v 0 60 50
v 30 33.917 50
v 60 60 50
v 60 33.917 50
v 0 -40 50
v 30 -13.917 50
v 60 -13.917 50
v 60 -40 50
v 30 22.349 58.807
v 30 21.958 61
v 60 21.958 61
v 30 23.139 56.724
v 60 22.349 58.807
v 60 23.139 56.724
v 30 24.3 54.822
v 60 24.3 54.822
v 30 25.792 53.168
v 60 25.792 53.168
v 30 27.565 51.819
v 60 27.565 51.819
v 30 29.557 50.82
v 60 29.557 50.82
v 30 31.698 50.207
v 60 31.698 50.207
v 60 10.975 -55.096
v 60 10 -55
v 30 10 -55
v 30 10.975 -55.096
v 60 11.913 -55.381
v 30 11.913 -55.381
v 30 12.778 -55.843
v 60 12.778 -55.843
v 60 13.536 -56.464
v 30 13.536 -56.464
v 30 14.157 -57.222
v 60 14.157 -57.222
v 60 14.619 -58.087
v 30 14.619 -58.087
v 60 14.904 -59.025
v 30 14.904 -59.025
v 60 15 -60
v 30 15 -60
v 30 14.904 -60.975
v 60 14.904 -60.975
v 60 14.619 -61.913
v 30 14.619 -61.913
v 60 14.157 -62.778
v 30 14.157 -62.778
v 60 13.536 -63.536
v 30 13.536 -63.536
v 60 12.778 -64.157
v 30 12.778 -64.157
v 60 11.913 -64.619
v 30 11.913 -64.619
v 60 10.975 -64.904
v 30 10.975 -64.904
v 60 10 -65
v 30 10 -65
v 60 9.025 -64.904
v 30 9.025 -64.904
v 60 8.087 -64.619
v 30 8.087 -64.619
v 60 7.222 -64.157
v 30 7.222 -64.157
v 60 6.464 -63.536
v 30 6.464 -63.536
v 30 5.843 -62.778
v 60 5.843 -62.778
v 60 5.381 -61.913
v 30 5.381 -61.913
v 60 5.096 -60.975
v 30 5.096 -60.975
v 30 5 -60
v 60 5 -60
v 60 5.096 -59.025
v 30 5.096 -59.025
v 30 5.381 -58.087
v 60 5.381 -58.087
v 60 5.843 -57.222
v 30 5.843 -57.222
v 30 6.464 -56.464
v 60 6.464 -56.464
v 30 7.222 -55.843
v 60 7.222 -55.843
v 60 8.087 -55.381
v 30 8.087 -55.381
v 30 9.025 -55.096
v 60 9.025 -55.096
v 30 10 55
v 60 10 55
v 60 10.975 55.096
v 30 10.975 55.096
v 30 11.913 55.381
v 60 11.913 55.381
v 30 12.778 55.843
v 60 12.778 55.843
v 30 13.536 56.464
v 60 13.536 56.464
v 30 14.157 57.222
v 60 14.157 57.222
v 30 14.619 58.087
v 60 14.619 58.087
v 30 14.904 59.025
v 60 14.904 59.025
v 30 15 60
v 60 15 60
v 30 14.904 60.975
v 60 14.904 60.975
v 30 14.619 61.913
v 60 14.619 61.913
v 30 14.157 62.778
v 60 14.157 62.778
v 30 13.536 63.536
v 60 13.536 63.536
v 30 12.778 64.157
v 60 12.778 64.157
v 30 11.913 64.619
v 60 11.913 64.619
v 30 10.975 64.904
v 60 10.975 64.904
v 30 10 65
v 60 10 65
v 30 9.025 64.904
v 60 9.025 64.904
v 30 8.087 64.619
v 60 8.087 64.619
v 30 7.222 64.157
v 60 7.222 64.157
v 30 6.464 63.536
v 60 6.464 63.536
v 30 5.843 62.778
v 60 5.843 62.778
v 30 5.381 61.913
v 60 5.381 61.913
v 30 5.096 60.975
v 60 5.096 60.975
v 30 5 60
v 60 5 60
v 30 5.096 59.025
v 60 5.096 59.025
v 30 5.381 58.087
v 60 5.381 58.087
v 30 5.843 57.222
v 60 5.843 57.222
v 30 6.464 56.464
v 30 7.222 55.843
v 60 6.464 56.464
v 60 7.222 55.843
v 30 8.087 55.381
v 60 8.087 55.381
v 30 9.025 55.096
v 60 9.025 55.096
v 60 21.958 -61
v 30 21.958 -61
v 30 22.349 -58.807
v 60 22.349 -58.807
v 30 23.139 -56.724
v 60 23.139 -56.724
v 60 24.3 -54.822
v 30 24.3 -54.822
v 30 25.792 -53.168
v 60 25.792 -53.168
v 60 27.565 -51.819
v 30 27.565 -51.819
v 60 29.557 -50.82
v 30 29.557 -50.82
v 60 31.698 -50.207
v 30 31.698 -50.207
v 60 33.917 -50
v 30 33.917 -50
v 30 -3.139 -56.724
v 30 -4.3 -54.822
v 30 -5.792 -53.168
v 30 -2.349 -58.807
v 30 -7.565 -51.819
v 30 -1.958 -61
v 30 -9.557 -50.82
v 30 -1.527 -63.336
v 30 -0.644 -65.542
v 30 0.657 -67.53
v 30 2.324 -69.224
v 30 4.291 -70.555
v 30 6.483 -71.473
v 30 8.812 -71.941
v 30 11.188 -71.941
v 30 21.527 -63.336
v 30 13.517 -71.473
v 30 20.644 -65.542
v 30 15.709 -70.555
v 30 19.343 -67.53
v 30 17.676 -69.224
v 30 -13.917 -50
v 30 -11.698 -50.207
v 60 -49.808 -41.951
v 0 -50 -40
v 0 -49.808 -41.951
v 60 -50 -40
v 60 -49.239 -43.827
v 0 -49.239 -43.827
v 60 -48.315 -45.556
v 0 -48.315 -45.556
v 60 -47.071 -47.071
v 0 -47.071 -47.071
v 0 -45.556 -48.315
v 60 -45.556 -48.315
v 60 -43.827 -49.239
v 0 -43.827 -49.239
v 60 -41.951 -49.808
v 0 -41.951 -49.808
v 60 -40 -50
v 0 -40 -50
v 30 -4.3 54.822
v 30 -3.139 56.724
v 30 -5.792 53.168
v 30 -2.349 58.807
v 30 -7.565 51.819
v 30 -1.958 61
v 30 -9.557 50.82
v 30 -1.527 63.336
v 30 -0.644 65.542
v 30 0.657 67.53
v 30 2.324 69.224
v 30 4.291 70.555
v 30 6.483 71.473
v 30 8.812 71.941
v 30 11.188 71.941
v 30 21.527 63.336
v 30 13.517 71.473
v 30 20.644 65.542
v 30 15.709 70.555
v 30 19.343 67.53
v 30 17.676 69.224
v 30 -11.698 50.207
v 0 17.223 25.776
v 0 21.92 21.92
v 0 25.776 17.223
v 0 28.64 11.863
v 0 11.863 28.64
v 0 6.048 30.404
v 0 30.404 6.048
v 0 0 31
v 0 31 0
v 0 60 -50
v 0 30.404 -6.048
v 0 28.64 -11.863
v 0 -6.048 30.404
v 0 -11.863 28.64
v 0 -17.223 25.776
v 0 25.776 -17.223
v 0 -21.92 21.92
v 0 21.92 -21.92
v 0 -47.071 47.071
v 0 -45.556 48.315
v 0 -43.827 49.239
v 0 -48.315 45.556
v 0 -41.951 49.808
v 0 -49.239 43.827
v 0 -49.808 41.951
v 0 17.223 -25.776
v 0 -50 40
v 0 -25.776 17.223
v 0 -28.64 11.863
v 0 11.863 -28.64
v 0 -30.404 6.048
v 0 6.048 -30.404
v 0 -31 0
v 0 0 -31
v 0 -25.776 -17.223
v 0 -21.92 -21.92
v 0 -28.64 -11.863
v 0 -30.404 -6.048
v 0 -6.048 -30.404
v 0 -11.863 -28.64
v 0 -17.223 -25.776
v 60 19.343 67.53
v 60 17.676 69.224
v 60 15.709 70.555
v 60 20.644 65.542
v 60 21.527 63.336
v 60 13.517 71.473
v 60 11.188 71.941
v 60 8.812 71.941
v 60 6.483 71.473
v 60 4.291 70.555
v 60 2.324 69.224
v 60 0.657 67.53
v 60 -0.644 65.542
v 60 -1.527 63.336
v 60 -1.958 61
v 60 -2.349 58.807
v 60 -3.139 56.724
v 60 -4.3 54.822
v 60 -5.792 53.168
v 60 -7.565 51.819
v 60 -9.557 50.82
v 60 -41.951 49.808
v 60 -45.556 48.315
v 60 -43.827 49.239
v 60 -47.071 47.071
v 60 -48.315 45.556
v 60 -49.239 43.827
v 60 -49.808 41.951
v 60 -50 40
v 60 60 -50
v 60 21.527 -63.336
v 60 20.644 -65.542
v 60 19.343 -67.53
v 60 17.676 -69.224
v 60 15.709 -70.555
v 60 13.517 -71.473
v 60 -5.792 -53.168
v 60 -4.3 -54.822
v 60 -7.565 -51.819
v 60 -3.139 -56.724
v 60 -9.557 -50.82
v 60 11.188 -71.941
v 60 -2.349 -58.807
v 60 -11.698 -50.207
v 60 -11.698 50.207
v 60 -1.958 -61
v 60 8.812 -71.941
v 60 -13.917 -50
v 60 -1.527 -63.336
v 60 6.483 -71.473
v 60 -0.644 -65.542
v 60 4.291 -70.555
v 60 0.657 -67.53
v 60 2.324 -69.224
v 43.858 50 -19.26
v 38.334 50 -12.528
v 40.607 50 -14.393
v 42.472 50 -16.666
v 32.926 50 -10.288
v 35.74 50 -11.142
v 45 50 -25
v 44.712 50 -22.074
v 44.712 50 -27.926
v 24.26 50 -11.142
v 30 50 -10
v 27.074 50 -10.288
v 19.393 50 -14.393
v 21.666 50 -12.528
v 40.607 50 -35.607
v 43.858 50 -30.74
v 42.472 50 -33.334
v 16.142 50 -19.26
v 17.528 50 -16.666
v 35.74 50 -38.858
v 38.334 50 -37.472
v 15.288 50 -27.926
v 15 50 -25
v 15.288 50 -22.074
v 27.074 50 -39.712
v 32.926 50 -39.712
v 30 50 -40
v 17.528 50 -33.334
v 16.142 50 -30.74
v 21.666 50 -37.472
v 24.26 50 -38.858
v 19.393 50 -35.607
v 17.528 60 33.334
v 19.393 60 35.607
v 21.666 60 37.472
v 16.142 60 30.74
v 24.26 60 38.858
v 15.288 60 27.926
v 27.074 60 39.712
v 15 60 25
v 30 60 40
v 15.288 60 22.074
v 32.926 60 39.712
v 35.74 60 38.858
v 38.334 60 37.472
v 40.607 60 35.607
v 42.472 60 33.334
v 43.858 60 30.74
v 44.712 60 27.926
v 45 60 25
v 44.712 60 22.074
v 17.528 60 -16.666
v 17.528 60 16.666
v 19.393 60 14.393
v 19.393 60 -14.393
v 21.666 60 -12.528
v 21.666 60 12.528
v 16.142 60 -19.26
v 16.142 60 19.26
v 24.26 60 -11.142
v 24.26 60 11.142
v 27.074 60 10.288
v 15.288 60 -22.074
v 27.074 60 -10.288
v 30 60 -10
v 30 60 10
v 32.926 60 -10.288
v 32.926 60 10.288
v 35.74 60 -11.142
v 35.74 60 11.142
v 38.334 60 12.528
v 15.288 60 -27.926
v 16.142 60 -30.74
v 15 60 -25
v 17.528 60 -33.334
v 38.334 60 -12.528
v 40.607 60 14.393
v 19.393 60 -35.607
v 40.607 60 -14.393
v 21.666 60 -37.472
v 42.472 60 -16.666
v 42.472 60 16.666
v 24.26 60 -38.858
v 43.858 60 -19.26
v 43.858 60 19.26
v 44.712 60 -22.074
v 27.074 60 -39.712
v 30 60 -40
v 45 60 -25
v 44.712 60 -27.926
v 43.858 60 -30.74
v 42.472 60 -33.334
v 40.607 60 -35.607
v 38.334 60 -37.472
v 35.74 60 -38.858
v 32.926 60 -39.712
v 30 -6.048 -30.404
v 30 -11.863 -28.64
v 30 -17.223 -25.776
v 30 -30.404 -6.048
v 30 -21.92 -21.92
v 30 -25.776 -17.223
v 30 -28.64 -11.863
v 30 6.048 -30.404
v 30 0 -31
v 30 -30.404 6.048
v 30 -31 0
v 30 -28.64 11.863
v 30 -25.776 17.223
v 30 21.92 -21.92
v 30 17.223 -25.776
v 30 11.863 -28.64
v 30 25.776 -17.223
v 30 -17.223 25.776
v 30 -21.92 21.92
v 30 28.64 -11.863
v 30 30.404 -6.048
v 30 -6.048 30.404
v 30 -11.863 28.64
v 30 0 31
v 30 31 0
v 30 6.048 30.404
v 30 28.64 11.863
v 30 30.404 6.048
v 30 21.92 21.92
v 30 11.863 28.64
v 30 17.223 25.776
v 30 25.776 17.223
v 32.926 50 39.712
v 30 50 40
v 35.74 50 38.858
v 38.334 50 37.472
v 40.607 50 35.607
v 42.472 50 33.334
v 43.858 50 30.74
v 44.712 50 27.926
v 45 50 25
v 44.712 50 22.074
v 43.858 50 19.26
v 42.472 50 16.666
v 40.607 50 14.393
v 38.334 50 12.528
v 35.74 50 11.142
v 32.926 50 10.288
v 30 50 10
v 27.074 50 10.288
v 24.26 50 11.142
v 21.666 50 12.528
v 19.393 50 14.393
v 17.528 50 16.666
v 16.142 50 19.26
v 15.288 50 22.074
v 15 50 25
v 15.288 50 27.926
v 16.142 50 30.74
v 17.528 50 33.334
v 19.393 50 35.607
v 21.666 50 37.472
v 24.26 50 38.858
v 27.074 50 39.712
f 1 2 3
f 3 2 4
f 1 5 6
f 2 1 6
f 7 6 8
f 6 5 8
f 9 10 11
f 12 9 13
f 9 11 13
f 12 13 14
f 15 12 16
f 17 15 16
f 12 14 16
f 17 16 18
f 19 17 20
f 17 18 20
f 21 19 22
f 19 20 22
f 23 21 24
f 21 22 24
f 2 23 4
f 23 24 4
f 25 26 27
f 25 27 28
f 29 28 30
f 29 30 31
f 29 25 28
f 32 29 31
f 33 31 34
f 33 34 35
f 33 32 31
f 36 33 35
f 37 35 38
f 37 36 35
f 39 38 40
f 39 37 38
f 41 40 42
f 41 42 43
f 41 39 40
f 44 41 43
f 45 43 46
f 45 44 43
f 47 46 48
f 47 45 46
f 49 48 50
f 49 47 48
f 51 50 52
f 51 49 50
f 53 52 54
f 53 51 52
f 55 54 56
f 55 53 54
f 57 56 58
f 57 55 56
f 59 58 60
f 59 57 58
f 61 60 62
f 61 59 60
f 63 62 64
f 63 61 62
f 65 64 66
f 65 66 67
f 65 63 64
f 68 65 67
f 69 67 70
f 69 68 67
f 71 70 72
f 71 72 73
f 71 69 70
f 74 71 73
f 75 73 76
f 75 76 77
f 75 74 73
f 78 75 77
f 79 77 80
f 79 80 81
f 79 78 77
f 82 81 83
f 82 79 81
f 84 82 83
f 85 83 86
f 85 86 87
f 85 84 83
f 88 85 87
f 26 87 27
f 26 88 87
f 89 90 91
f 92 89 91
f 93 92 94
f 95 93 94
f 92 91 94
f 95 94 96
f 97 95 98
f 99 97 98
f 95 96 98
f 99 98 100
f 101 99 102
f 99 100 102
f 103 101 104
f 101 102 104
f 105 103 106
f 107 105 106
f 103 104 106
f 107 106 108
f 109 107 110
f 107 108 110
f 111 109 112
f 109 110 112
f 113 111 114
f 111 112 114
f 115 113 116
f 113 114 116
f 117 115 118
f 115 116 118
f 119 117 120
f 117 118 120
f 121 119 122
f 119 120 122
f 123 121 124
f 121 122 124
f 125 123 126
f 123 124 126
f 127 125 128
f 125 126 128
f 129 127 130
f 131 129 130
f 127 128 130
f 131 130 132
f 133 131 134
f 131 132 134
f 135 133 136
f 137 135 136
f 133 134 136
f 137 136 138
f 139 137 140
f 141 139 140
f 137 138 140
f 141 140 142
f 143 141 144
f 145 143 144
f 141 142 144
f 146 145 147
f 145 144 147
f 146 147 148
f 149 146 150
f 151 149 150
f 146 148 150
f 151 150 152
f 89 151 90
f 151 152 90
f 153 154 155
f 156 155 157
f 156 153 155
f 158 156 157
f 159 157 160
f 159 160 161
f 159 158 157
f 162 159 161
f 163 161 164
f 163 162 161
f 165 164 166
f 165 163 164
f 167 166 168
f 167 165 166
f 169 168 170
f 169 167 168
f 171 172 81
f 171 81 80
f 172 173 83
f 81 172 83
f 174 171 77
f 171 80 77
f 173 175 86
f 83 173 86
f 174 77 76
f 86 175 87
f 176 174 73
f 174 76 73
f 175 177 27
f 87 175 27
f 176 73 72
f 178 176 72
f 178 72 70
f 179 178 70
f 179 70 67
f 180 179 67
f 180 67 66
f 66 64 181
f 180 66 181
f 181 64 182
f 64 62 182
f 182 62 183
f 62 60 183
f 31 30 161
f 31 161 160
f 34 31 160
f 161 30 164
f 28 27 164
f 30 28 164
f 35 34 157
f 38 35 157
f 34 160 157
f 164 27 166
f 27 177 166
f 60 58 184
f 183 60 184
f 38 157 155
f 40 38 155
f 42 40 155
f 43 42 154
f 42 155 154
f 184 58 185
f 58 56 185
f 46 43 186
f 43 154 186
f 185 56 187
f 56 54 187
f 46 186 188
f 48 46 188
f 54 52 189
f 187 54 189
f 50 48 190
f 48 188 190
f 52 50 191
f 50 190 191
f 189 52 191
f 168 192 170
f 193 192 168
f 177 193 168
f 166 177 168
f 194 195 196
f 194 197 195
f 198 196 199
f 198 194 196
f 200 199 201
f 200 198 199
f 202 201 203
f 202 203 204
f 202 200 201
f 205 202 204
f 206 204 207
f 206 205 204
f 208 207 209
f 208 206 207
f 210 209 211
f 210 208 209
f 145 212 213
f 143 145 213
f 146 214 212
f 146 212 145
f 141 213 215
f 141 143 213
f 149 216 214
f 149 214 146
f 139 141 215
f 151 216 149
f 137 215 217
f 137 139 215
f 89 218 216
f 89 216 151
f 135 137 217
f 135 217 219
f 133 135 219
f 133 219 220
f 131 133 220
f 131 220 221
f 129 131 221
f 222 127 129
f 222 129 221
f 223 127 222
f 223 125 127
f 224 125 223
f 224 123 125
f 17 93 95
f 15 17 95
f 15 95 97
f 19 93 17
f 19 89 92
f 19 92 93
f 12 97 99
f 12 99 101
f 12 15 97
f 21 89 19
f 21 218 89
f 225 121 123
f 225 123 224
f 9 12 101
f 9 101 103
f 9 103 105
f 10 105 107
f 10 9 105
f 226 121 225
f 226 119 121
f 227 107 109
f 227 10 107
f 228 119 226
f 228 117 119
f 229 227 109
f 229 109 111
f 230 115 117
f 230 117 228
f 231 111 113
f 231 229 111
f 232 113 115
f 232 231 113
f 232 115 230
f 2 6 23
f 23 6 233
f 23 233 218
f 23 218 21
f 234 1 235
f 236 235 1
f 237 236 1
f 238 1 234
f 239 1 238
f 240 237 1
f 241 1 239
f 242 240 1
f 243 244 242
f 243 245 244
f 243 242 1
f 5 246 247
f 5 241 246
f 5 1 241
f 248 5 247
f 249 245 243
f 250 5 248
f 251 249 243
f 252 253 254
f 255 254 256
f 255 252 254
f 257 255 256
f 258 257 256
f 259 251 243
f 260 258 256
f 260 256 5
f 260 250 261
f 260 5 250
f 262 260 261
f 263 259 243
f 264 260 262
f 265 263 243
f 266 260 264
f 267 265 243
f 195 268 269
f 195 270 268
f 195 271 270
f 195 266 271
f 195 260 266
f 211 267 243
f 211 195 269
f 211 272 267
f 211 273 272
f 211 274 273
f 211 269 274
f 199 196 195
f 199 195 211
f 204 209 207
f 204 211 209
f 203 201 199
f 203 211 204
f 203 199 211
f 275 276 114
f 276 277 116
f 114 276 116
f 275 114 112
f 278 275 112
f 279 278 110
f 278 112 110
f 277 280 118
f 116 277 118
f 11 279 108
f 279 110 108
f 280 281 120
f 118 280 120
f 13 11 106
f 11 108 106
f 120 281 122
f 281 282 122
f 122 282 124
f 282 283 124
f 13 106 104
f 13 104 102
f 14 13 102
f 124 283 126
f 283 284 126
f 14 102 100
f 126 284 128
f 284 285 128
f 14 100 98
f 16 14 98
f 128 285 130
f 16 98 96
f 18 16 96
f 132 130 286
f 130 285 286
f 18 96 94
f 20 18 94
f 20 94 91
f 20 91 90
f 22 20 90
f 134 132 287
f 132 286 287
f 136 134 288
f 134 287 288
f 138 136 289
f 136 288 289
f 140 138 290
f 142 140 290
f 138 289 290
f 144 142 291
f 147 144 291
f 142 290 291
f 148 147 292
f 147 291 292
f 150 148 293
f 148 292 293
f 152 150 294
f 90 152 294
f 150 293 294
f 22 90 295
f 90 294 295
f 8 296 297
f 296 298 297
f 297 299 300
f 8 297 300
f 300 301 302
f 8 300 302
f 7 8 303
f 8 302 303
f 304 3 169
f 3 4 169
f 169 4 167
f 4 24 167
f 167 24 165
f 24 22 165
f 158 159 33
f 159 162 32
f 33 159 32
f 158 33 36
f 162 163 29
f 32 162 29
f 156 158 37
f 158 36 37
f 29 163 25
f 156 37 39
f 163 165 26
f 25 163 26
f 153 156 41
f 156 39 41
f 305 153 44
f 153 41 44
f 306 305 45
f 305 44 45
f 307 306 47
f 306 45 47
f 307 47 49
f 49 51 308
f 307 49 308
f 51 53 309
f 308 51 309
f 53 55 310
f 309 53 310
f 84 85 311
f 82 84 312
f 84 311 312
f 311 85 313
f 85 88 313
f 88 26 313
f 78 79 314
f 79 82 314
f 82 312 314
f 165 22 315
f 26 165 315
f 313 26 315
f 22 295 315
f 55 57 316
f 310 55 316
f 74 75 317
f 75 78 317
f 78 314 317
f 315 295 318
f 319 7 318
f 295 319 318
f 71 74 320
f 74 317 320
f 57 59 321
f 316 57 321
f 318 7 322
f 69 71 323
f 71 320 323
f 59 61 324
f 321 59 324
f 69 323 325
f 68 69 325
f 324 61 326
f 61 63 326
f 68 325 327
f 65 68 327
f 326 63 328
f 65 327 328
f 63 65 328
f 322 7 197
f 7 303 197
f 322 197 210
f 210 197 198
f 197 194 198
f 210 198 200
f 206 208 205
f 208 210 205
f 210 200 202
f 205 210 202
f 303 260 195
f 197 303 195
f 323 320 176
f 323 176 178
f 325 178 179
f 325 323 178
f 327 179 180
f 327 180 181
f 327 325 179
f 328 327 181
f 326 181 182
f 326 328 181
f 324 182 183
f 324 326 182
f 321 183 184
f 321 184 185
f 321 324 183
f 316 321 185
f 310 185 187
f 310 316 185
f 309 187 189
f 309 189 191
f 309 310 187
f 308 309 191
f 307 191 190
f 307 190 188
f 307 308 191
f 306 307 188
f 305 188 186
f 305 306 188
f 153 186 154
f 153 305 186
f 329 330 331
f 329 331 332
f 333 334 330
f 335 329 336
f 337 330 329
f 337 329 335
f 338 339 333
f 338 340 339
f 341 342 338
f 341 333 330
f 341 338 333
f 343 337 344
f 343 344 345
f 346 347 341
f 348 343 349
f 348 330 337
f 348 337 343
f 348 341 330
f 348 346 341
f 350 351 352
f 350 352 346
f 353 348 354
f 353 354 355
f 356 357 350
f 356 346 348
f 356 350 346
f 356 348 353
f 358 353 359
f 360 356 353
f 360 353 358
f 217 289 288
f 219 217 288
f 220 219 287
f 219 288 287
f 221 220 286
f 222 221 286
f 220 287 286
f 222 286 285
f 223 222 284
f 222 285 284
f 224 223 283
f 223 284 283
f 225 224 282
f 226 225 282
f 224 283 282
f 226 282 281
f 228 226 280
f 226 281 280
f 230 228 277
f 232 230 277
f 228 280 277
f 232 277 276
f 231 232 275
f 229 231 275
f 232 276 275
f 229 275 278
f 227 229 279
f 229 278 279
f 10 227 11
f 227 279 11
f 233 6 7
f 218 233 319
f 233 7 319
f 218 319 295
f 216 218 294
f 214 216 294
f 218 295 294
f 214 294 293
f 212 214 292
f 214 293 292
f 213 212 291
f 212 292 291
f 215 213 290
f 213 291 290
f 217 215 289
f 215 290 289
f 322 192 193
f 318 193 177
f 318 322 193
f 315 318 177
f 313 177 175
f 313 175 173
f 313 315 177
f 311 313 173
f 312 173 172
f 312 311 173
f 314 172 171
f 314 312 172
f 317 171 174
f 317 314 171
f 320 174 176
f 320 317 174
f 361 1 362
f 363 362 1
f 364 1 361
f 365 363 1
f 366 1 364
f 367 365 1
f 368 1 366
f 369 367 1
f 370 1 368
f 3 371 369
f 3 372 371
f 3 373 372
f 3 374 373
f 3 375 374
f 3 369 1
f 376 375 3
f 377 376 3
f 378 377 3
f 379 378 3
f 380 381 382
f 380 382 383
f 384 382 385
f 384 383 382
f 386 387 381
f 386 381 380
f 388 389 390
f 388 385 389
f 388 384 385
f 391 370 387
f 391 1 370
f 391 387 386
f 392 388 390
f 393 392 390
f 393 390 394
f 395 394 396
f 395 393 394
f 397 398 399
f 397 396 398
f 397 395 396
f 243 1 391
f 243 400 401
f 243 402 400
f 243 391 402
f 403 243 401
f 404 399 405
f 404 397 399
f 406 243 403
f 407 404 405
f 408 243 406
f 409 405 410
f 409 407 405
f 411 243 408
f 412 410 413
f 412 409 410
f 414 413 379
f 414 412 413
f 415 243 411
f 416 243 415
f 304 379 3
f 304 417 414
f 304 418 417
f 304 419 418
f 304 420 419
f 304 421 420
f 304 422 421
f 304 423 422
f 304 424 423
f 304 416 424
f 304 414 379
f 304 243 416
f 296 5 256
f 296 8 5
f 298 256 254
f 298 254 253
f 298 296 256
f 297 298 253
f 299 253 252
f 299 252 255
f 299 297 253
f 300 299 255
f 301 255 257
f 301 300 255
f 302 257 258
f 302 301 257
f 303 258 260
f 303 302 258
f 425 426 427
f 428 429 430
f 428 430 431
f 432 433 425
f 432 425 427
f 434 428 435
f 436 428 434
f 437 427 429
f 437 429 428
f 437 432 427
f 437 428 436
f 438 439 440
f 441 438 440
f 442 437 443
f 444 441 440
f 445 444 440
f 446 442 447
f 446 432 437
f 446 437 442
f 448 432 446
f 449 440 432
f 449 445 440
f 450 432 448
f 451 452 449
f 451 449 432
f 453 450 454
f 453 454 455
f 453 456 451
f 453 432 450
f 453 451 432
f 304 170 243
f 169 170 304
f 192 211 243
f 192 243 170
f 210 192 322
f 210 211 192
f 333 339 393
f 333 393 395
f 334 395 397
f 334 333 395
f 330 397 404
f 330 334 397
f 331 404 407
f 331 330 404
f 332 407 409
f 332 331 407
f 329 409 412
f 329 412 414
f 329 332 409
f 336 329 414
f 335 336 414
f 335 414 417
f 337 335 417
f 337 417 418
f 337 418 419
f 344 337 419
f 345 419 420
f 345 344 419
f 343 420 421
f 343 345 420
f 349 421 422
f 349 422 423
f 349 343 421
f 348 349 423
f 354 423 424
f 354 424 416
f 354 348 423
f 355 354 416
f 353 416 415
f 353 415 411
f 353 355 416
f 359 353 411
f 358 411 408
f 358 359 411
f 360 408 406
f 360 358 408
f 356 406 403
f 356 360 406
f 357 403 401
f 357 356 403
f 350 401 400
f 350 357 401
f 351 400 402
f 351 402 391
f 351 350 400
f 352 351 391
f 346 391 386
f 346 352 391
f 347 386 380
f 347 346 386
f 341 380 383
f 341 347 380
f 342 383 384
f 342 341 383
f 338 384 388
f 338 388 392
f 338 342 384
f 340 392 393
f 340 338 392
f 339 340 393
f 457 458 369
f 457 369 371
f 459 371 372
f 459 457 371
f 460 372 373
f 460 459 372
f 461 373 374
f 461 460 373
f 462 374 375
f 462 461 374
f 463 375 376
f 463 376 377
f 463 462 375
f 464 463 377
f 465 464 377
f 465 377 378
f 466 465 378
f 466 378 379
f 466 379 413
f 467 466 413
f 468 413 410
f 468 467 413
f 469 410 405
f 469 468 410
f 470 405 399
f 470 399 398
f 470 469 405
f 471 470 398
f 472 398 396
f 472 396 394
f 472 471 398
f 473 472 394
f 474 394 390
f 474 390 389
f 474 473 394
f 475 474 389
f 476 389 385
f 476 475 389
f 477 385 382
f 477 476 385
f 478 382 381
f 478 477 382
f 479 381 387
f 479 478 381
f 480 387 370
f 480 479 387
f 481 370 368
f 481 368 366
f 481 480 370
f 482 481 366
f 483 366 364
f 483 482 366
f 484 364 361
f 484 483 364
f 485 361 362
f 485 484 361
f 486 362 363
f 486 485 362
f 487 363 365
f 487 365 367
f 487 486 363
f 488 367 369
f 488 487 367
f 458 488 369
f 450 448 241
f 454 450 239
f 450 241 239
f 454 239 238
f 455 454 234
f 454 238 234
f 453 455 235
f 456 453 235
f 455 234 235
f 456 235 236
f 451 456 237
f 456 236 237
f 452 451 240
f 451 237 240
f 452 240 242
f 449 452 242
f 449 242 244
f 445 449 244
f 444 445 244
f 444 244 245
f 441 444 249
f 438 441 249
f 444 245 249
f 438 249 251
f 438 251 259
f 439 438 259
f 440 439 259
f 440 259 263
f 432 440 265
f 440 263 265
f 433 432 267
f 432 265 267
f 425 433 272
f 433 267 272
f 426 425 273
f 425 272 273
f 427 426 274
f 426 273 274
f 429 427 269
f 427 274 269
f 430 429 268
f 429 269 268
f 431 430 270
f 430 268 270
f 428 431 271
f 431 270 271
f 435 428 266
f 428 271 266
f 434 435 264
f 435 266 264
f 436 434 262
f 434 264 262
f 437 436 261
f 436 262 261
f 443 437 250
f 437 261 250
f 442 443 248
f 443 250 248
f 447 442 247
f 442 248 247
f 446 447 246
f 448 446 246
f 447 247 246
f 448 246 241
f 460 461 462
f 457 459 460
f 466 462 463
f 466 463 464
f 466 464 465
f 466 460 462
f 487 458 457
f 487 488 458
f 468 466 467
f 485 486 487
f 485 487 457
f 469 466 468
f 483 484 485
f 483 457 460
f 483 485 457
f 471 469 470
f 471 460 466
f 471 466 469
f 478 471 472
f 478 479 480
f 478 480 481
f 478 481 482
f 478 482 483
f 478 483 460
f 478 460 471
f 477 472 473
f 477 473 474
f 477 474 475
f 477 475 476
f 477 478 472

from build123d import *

# Parameters (mm, degrees)
SKETCH2_W           = 100
SKETCH2_H           = 100
BOSS_EXTRUDE1_DEPTH = 60
SKETCH3_R           = 31
CUT_EXTRUDE1_DEPTH  = 30
FILLET1_R           = 10
SKETCH4_W           = 60
SKETCH4_H           = 100
SKETCH4_R           = 15
BOSS_EXTRUDE2_DEPTH = 10
SKETCH6_R           = 5
BOSS_EXTRUDE3_DEPTH = 30


with BuildPart() as part:
    # Sketch2 → Boss-Extrude1 (new body)
    with BuildSketch(Plane(origin=(0, 0, 0), x_dir=(0, 0, -1), z_dir=(1, 0, 0))):
        Rectangle(SKETCH2_W, SKETCH2_H)
    extrude(amount=BOSS_EXTRUDE1_DEPTH)

    # Sketch3 → Cut-Extrude1 (cut)
    with BuildSketch(Plane.ZY):
        Circle(SKETCH3_R)
    extrude(amount=-CUT_EXTRUDE1_DEPTH, mode=Mode.SUBTRACT)

    # Fillet1
    fillet1_edges = [part.edges().sort_by_distance(p)[0] for p in [
        (30, -50, -50),
        (30, -50, 50),
    ]]
    fillet(fillet1_edges, radius=FILLET1_R)

    # Sketch4 → Boss-Extrude2 (add)
    with BuildSketch(Plane(origin=(0, 50, 0), x_dir=(1, 0, 0), z_dir=(0, 1, 0))):
        with Locations((30, 0)):
            Rectangle(SKETCH4_W, SKETCH4_H)
        with Locations(Location((30, 25, 0), (0, 0, 270))):
            Circle(SKETCH4_R, mode=Mode.SUBTRACT)
        with Locations(Location((30, -25, 0), (0, 0, 270))):
            Circle(SKETCH4_R, mode=Mode.SUBTRACT)
    extrude(amount=BOSS_EXTRUDE2_DEPTH)

    # Sketch6 → Boss-Extrude3 (add)
    with BuildSketch(Plane(origin=(60, 0, 0), x_dir=(0, 0, -1), z_dir=(1, 0, 0))):
        with BuildLine():
            Line((-50, 33.916521486), (-50, -13.916521486))
            ThreePointArc((-50, -13.916521486), (-53.168239134, -5.792483082), (-61, -1.958260743))
            ThreePointArc((-61, -1.958260743), (-72, 10), (-61, 21.958260743))
            ThreePointArc((-61, 21.958260743), (-53.168239134, 25.792483082), (-50, 33.916521486))
        make_face()
        with Locations((-60, 10)):
            Circle(SKETCH6_R, mode=Mode.SUBTRACT)
    boss_extrude3 = extrude(amount=-BOSS_EXTRUDE3_DEPTH)

    # Mirror1: Boss-Extrude3 across plane
    add(boss_extrude3.mirror(Plane(origin=(0, 0, 0), x_dir=(1, 0, 0), z_dir=(0, 0, -1))))


solid = part.part
